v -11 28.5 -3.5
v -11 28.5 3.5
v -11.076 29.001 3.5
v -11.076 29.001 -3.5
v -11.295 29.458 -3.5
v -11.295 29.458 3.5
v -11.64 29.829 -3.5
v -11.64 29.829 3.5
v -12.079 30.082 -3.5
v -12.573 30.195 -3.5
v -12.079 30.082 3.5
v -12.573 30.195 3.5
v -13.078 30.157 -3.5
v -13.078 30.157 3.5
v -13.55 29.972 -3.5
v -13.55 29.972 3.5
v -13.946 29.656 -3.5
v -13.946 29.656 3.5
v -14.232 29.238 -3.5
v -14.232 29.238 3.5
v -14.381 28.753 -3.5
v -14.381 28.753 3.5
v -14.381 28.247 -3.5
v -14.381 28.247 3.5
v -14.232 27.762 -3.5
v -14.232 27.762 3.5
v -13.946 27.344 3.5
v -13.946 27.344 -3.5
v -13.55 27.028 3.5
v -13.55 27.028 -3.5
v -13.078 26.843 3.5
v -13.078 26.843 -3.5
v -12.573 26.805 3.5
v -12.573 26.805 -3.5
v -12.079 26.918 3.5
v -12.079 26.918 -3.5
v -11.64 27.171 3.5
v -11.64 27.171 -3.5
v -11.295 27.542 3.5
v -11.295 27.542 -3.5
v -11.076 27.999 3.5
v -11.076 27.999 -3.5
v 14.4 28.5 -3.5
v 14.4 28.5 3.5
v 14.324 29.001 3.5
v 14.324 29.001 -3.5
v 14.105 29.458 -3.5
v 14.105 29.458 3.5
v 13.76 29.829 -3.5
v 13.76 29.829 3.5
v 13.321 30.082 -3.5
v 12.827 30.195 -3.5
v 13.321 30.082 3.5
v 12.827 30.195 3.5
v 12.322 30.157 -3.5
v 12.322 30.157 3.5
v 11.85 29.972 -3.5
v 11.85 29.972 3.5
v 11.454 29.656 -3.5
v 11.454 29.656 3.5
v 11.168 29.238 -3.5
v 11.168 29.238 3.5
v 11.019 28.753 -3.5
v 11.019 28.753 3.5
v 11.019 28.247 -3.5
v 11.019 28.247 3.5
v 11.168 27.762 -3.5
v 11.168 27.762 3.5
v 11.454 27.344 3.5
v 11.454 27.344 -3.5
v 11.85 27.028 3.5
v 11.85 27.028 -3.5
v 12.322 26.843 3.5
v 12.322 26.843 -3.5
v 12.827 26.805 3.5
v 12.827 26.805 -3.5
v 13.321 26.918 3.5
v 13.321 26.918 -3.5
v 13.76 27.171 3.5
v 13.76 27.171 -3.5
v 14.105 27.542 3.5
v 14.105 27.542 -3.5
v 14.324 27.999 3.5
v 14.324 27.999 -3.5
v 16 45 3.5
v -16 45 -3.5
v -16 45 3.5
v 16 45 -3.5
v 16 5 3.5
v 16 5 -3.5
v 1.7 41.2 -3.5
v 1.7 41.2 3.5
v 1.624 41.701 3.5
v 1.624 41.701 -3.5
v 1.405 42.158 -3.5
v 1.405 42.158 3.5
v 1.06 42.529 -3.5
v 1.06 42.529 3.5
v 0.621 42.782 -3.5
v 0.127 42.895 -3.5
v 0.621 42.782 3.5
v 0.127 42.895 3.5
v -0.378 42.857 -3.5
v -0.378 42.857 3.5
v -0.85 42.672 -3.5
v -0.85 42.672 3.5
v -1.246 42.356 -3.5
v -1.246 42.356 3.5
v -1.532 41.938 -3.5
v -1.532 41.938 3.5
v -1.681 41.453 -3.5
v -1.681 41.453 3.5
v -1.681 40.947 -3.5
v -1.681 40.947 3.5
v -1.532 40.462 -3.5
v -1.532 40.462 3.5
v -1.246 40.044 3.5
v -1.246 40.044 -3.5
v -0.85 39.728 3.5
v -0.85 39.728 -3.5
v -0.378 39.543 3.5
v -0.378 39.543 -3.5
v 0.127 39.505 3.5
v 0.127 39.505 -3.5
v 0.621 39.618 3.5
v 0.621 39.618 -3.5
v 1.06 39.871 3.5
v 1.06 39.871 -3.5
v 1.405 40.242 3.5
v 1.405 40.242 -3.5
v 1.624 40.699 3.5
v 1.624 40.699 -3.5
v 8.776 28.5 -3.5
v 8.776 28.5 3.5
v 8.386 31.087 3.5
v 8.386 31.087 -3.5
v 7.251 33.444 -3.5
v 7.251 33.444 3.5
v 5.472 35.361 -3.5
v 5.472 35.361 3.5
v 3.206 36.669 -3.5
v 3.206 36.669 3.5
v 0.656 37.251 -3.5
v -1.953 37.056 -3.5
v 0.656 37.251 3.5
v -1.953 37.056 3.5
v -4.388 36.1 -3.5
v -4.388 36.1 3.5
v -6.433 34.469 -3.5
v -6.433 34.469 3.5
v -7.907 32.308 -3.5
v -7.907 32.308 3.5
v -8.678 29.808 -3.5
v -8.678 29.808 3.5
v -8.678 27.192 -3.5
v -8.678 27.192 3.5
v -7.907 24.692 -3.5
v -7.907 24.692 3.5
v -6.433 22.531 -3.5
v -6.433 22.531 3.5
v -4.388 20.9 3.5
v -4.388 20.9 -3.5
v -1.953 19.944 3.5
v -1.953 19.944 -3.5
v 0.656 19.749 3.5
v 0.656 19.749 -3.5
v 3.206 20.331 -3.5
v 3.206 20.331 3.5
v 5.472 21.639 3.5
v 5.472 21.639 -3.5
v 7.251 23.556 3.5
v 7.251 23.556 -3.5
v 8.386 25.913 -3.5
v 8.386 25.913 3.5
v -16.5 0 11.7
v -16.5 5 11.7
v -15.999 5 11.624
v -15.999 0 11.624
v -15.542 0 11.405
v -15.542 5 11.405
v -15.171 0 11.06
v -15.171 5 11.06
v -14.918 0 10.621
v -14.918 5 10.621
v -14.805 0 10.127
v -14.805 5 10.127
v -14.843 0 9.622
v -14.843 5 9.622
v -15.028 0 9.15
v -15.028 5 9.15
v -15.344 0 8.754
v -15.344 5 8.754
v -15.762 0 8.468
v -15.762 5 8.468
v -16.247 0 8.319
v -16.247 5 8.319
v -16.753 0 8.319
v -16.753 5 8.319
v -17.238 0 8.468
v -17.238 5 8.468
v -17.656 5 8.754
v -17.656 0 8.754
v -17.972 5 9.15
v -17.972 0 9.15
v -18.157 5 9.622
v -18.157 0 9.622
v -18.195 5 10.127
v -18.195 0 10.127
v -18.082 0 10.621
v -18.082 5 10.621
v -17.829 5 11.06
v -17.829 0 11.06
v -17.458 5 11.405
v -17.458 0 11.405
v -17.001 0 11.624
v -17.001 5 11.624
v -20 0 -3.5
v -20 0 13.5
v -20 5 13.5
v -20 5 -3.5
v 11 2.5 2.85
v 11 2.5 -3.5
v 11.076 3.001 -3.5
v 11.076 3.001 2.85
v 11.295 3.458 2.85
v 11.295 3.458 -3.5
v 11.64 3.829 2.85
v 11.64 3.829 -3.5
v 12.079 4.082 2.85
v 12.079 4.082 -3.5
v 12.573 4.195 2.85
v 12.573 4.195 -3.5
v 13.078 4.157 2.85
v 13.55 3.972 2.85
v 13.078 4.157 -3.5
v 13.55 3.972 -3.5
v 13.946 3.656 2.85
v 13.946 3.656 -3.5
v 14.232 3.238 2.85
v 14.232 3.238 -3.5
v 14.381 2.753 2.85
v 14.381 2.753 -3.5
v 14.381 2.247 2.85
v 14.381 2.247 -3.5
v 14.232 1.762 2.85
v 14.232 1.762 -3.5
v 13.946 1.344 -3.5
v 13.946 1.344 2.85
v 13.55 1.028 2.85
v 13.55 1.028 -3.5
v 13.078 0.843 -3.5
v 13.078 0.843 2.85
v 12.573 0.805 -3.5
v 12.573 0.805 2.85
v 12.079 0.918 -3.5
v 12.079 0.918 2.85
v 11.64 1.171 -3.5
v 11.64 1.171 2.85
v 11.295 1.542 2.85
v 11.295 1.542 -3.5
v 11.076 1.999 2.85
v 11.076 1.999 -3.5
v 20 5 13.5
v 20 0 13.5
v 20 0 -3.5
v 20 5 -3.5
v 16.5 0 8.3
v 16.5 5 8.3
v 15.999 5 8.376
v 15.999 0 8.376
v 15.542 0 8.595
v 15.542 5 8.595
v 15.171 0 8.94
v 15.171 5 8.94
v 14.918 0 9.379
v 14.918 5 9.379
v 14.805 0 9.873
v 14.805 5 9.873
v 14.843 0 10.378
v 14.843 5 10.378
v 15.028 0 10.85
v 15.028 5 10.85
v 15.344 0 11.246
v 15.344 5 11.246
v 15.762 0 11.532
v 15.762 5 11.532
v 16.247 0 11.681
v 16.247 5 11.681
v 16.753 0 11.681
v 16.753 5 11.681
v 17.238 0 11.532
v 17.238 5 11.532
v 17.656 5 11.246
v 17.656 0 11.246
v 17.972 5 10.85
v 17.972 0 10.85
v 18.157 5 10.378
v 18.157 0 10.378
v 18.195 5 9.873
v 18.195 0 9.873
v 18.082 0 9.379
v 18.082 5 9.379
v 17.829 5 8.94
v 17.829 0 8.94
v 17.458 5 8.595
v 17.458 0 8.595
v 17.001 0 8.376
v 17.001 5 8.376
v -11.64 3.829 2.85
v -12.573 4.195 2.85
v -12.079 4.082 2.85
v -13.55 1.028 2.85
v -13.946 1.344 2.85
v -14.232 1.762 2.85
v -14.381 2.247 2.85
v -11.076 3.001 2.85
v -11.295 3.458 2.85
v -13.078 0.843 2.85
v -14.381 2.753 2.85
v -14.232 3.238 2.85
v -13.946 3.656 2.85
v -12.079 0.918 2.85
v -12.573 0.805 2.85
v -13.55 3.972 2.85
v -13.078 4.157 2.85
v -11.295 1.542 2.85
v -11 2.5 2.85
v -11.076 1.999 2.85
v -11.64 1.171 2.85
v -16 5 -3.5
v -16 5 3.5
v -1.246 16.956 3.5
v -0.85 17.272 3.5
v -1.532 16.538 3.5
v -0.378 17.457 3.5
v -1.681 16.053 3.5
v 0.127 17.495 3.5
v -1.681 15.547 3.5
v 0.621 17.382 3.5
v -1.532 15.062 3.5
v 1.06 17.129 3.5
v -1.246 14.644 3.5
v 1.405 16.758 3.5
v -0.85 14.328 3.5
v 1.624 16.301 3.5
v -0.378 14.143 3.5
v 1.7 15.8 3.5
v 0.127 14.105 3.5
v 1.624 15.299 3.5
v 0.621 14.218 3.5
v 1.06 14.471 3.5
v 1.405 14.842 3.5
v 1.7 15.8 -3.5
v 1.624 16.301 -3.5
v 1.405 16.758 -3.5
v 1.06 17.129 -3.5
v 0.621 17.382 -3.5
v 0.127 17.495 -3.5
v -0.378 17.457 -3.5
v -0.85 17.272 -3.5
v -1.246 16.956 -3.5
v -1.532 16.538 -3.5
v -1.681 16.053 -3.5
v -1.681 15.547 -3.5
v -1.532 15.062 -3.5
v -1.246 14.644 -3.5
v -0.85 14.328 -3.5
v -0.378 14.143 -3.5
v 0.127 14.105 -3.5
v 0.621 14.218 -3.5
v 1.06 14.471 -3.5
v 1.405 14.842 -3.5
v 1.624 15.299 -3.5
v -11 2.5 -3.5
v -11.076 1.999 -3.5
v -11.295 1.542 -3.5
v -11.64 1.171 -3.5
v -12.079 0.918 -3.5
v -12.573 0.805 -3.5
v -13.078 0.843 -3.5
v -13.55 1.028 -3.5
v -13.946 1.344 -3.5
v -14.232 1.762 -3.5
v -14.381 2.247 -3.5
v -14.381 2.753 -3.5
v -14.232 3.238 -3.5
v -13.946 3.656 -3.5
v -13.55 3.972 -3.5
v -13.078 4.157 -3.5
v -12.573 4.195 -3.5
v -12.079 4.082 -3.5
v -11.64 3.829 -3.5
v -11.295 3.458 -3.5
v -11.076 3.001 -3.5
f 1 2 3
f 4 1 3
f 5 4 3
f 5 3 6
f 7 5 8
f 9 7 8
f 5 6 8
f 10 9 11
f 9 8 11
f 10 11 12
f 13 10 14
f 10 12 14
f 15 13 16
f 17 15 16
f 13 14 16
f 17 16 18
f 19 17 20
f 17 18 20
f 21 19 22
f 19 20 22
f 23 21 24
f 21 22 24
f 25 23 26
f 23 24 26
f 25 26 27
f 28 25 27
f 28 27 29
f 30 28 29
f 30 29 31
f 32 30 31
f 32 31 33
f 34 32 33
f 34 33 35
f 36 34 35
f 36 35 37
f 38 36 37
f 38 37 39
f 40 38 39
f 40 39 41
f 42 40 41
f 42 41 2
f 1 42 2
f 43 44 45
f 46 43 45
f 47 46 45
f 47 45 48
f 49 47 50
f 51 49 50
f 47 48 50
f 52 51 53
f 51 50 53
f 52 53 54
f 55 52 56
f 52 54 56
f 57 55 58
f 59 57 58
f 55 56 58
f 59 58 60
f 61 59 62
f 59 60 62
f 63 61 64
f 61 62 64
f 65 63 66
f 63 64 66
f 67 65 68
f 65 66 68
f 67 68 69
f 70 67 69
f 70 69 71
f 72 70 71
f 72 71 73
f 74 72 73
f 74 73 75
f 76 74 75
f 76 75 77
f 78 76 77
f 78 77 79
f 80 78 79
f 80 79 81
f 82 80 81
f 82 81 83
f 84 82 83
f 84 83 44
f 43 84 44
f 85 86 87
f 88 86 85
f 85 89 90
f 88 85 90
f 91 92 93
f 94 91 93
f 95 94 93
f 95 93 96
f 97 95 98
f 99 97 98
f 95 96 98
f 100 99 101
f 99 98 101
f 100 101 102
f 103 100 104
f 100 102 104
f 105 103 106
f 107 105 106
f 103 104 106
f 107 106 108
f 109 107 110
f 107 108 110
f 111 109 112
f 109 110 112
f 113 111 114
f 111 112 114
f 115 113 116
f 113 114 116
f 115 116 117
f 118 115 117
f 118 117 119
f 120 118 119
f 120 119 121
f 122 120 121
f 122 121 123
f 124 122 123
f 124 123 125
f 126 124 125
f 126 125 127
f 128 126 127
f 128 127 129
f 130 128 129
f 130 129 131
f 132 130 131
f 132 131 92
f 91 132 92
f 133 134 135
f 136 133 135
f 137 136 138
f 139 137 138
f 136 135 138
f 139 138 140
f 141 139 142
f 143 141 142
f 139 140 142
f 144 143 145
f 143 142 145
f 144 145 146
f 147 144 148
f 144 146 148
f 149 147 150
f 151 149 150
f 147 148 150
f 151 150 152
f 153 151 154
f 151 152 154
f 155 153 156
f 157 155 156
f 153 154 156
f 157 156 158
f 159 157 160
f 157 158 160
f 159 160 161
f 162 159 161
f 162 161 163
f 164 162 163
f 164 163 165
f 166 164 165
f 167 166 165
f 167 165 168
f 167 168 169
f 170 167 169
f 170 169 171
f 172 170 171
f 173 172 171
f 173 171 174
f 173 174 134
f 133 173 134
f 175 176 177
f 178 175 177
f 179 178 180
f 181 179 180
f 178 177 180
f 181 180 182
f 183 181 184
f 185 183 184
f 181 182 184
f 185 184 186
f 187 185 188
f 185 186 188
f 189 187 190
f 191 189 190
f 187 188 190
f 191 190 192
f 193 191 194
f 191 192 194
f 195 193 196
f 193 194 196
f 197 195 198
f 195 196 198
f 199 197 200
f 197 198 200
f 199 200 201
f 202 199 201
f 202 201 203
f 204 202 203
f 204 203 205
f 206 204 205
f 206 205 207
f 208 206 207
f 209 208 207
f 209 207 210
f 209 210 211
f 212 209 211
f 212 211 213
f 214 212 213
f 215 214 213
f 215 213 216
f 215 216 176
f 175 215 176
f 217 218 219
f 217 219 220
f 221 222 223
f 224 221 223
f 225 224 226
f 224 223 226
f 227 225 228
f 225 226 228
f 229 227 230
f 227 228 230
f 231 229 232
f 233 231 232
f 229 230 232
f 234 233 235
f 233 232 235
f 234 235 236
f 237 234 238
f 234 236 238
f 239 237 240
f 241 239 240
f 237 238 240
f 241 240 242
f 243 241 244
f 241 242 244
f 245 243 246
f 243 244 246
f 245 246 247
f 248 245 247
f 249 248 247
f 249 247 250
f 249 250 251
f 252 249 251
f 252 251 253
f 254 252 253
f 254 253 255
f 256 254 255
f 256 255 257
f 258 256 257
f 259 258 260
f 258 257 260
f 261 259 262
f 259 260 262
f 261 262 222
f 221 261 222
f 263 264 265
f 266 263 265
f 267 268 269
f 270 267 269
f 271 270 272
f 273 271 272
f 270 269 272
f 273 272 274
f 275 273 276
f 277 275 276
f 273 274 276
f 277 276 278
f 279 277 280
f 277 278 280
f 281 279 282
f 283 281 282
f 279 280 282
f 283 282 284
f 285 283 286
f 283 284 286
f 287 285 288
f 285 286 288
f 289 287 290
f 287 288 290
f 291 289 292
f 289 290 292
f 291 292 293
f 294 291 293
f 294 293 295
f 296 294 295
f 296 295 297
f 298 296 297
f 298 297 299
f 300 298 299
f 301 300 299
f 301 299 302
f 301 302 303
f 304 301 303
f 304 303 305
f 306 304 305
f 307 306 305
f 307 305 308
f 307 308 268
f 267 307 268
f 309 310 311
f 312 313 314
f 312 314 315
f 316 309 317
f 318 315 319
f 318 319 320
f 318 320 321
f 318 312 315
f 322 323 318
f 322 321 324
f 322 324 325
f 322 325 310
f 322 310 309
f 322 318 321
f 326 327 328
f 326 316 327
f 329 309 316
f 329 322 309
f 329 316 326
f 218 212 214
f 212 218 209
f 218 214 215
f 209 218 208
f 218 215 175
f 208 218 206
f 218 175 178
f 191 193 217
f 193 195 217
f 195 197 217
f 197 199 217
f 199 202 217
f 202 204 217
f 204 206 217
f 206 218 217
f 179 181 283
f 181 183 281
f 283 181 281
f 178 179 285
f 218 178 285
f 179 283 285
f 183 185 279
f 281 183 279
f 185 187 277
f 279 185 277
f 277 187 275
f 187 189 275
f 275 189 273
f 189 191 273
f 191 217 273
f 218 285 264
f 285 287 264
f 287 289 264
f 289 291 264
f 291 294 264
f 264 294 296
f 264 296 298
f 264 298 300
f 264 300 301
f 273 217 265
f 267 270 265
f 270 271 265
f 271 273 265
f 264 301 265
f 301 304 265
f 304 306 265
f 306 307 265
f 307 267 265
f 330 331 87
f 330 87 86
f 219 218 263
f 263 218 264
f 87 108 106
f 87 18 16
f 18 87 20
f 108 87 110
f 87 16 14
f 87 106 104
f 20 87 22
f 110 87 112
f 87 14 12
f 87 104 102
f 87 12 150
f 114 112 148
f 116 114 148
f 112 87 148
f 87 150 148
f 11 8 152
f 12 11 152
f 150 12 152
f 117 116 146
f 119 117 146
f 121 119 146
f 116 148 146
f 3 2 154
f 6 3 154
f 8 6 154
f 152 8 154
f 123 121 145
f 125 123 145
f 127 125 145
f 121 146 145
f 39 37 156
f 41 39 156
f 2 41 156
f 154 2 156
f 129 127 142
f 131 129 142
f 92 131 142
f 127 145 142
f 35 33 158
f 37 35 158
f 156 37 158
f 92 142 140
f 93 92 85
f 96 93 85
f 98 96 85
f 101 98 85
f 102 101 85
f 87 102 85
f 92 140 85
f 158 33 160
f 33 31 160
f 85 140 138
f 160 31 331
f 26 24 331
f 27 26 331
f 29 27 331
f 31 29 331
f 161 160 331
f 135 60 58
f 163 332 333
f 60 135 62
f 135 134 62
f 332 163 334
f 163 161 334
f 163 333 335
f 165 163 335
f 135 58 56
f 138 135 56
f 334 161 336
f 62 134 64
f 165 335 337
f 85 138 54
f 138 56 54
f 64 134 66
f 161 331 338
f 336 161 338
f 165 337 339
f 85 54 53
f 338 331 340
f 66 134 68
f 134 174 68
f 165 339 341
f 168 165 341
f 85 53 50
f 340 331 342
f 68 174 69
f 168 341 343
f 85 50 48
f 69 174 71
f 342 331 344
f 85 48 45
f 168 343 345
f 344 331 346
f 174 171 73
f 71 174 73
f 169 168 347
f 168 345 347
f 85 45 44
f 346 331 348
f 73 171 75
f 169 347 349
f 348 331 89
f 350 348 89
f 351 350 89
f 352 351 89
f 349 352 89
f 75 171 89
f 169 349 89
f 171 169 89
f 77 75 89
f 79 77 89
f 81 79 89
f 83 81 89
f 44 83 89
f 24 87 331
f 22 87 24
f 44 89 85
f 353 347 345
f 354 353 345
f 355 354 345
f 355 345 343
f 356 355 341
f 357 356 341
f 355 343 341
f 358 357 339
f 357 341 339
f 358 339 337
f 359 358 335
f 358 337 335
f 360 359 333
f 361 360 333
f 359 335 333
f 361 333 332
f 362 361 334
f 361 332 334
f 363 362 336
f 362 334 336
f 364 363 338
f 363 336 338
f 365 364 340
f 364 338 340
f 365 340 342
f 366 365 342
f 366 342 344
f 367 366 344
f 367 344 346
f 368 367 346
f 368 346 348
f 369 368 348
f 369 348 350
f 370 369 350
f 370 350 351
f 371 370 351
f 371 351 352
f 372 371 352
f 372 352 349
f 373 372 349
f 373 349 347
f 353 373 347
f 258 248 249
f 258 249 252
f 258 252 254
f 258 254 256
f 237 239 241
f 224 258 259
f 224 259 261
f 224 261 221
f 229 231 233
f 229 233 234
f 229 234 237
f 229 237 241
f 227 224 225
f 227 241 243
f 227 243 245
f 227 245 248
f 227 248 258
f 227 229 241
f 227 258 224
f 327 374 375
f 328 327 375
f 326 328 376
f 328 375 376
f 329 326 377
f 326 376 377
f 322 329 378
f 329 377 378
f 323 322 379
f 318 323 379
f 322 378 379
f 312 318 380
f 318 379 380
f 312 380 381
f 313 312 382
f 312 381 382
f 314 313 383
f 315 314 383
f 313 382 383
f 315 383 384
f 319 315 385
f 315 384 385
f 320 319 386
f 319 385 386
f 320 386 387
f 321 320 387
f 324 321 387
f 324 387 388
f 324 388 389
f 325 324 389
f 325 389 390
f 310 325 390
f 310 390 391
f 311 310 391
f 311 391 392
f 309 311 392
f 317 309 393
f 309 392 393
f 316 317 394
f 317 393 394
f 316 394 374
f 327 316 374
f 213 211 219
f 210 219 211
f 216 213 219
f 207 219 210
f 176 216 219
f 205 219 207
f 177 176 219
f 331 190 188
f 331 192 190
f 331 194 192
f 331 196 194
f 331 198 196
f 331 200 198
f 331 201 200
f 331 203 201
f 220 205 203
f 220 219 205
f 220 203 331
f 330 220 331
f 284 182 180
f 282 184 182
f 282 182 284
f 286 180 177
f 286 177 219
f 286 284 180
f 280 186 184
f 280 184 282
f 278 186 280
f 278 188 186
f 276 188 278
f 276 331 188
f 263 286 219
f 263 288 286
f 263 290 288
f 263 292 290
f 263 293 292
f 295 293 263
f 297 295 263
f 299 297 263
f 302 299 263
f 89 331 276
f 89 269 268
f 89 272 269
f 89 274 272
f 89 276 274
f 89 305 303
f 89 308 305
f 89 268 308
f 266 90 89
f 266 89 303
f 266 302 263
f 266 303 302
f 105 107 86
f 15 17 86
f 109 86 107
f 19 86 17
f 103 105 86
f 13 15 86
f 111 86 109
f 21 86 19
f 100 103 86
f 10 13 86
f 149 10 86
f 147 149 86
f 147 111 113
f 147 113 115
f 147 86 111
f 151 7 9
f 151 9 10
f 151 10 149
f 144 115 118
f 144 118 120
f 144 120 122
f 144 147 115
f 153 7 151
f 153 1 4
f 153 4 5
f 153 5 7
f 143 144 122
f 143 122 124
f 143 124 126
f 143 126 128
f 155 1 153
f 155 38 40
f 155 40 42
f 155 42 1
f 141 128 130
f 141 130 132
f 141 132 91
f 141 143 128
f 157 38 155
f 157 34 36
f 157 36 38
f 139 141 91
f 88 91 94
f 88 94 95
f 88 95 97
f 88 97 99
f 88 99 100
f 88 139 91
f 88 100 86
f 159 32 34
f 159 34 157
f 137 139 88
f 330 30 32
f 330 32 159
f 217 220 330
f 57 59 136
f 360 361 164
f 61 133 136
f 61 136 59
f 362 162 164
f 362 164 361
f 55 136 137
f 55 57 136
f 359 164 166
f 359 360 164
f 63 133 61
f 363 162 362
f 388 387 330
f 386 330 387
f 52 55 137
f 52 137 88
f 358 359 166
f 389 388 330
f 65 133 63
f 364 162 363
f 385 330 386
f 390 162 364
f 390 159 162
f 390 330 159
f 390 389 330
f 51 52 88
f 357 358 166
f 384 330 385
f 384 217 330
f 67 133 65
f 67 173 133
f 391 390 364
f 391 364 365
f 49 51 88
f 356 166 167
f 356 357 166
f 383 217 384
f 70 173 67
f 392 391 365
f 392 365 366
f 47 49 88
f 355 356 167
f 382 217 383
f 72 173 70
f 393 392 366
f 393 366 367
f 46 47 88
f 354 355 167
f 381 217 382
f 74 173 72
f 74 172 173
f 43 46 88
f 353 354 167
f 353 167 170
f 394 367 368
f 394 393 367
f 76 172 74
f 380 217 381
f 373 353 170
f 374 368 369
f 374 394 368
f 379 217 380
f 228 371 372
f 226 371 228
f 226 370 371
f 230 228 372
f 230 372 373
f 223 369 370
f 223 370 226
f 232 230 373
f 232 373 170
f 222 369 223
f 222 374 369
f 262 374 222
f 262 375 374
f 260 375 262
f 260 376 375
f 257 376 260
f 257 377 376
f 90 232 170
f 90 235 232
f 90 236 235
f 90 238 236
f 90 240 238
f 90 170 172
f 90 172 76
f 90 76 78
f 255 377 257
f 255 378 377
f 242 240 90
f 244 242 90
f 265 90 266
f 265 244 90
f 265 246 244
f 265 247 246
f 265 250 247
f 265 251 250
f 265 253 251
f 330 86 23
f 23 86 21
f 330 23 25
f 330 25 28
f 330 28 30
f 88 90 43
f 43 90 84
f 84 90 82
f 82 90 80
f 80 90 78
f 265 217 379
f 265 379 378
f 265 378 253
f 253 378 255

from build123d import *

# Parameters (mm, degrees)
SKETCH1_W           = 40
SKETCH1_H           = 27
SKETCH1_W_2         = 32
SKETCH1_H_2         = 7
BOSS_EXTRUDE1_DEPTH = 5
SKETCH1_3_W         = 32
SKETCH1_3_H         = 7
BOSS_EXTRUDE2_DEPTH = 45
CUT_EXTRUDE1_REACH  = 54.096
SKETCH2_R           = 8.7757
CUT_EXTRUDE2_REACH  = 54.096
SKETCH4_R           = 1.7
CUT_EXTRUDE3_REACH  = 48.715
SKETCH5_R           = 1.7
CUT_EXTRUDE5_REACH  = 48.715
SKETCH7_W           = 40
SKETCH7_H           = 10
SKETCH8_R           = 1.7
CUT_EXTRUDE6_DEPTH  = 6.35


with BuildPart() as part:
    # Sketch1 → Boss-Extrude1 (new body)
    with BuildSketch(Plane(origin=(0, 0, 0), x_dir=(1, 0, 0), z_dir=(0, 1, 0))):
        Rectangle(SKETCH1_W, SKETCH1_H)
        Rectangle(SKETCH1_W_2, SKETCH1_H_2, mode=Mode.SUBTRACT)
    extrude(amount=BOSS_EXTRUDE1_DEPTH)

    # Sketch1<3> → Boss-Extrude2 (add)
    with BuildSketch(Plane(origin=(0, 0, 0), x_dir=(1, 0, 0), z_dir=(0, 1, 0))):
        Rectangle(SKETCH1_3_W, SKETCH1_3_H)
    extrude(amount=BOSS_EXTRUDE2_DEPTH)

    # Sketch2 → Cut-Extrude1 (cut, up to next)
    with BuildSketch(Plane.XY.offset(3.5), mode=Mode.PRIVATE) as cut_extrude1_sk1:
        with Locations((0, 28.5)):
            Circle(SKETCH2_R)
    cut_extrude1_tool1 = extrude(cut_extrude1_sk1.sketch, amount=-CUT_EXTRUDE1_REACH, mode=Mode.PRIVATE) & part.part
    add(cut_extrude1_tool1.solids().sort_by_distance((0, 28.5, 3.5))[0], mode=Mode.SUBTRACT)

    # Sketch4 → Cut-Extrude2 (cut, up to next)
    with BuildSketch(Plane.XY.offset(3.5), mode=Mode.PRIVATE) as cut_extrude2_sk1:
        with Locations((0, 41.2)):
            Circle(SKETCH4_R)
    cut_extrude2_tool1 = extrude(cut_extrude2_sk1.sketch, amount=-CUT_EXTRUDE2_REACH, mode=Mode.PRIVATE) & part.part
    # Sketch4 → Cut-Extrude2 (cut, up to next)
    with BuildSketch(Plane.XY.offset(3.5), mode=Mode.PRIVATE) as cut_extrude2_sk2:
        with Locations((12.7, 28.5)):
            Circle(SKETCH4_R)
    cut_extrude2_tool2 = extrude(cut_extrude2_sk2.sketch, amount=-CUT_EXTRUDE2_REACH, mode=Mode.PRIVATE) & part.part
    # Sketch4 → Cut-Extrude2 (cut, up to next)
    with BuildSketch(Plane.XY.offset(3.5), mode=Mode.PRIVATE) as cut_extrude2_sk3:
        with Locations((0, 15.8)):
            Circle(SKETCH4_R)
    cut_extrude2_tool3 = extrude(cut_extrude2_sk3.sketch, amount=-CUT_EXTRUDE2_REACH, mode=Mode.PRIVATE) & part.part
    # Sketch4 → Cut-Extrude2 (cut, up to next)
    with BuildSketch(Plane.XY.offset(3.5), mode=Mode.PRIVATE) as cut_extrude2_sk4:
        with Locations((-12.7, 28.5)):
            Circle(SKETCH4_R)
    cut_extrude2_tool4 = extrude(cut_extrude2_sk4.sketch, amount=-CUT_EXTRUDE2_REACH, mode=Mode.PRIVATE) & part.part
    add(cut_extrude2_tool1.solids().sort_by_distance((0, 41.2, 3.5))[0], mode=Mode.SUBTRACT)
    add(cut_extrude2_tool2.solids().sort_by_distance((12.7, 28.5, 3.5))[0], mode=Mode.SUBTRACT)
    add(cut_extrude2_tool3.solids().sort_by_distance((0, 15.8, 3.5))[0], mode=Mode.SUBTRACT)
    add(cut_extrude2_tool4.solids().sort_by_distance((-12.7, 28.5, 3.5))[0], mode=Mode.SUBTRACT)

    # Sketch5 → Cut-Extrude3 (cut, up to next)
    with BuildSketch(Plane(origin=(0, 5, 0), x_dir=(1, 0, 0), z_dir=(0, 1, 0)), mode=Mode.PRIVATE) as cut_extrude3_sk1:
        with Locations((-16.5, 10)):
            Circle(SKETCH5_R)
    cut_extrude3_tool1 = extrude(cut_extrude3_sk1.sketch, amount=-CUT_EXTRUDE3_REACH, mode=Mode.PRIVATE) & part.part
    # Sketch5 → Cut-Extrude3 (cut, up to next)
    with BuildSketch(Plane(origin=(0, 5, 0), x_dir=(1, 0, 0), z_dir=(0, 1, 0)), mode=Mode.PRIVATE) as cut_extrude3_sk2:
        with Locations((-16.5, -10)):
            Circle(SKETCH5_R)
    cut_extrude3_tool2 = extrude(cut_extrude3_sk2.sketch, amount=-CUT_EXTRUDE3_REACH, mode=Mode.PRIVATE) & part.part
    # Sketch5 → Cut-Extrude3 (cut, up to next)
    with BuildSketch(Plane(origin=(0, 5, 0), x_dir=(1, 0, 0), z_dir=(0, 1, 0)), mode=Mode.PRIVATE) as cut_extrude3_sk3:
        with Locations((16.5, -10)):
            Circle(SKETCH5_R)
    cut_extrude3_tool3 = extrude(cut_extrude3_sk3.sketch, amount=-CUT_EXTRUDE3_REACH, mode=Mode.PRIVATE) & part.part
    # Sketch5 → Cut-Extrude3 (cut, up to next)
    with BuildSketch(Plane(origin=(0, 5, 0), x_dir=(1, 0, 0), z_dir=(0, 1, 0)), mode=Mode.PRIVATE) as cut_extrude3_sk4:
        with Locations((16.5, 10)):
            Circle(SKETCH5_R)
    cut_extrude3_tool4 = extrude(cut_extrude3_sk4.sketch, amount=-CUT_EXTRUDE3_REACH, mode=Mode.PRIVATE) & part.part
    add(cut_extrude3_tool1.solids().sort_by_distance((-16.5, 5, -10))[0], mode=Mode.SUBTRACT)
    add(cut_extrude3_tool2.solids().sort_by_distance((-16.5, 5, 10))[0], mode=Mode.SUBTRACT)
    add(cut_extrude3_tool3.solids().sort_by_distance((16.5, 5, 10))[0], mode=Mode.SUBTRACT)
    add(cut_extrude3_tool4.solids().sort_by_distance((16.5, 5, -10))[0], mode=Mode.SUBTRACT)

    # Sketch7 → Cut-Extrude5 (cut, up to next)
    with BuildSketch(Plane(origin=(0, 5, 0), x_dir=(1, 0, 0), z_dir=(0, 1, 0)), mode=Mode.PRIVATE) as cut_extrude5_sk1:
        with Locations((0, 8.5)):
            Rectangle(SKETCH7_W, SKETCH7_H)
    cut_extrude5_tool1 = extrude(cut_extrude5_sk1.sketch, amount=-CUT_EXTRUDE5_REACH, mode=Mode.PRIVATE) & part.part
    add(cut_extrude5_tool1.solids().sort_by_distance((0, 5, -8.5))[0], mode=Mode.SUBTRACT)

    # Sketch8 → Cut-Extrude6 (cut)
    with BuildSketch(Plane(origin=(0, 0, -3.5), x_dir=(-1, 0, 0), z_dir=(0, 0, -1))):
        with Locations((-12.7, 2.5)):
            Circle(SKETCH8_R)
        with Locations((12.7, 2.5)):
            Circle(SKETCH8_R)
    extrude(amount=-CUT_EXTRUDE6_DEPTH, mode=Mode.SUBTRACT)


solid = part.part
